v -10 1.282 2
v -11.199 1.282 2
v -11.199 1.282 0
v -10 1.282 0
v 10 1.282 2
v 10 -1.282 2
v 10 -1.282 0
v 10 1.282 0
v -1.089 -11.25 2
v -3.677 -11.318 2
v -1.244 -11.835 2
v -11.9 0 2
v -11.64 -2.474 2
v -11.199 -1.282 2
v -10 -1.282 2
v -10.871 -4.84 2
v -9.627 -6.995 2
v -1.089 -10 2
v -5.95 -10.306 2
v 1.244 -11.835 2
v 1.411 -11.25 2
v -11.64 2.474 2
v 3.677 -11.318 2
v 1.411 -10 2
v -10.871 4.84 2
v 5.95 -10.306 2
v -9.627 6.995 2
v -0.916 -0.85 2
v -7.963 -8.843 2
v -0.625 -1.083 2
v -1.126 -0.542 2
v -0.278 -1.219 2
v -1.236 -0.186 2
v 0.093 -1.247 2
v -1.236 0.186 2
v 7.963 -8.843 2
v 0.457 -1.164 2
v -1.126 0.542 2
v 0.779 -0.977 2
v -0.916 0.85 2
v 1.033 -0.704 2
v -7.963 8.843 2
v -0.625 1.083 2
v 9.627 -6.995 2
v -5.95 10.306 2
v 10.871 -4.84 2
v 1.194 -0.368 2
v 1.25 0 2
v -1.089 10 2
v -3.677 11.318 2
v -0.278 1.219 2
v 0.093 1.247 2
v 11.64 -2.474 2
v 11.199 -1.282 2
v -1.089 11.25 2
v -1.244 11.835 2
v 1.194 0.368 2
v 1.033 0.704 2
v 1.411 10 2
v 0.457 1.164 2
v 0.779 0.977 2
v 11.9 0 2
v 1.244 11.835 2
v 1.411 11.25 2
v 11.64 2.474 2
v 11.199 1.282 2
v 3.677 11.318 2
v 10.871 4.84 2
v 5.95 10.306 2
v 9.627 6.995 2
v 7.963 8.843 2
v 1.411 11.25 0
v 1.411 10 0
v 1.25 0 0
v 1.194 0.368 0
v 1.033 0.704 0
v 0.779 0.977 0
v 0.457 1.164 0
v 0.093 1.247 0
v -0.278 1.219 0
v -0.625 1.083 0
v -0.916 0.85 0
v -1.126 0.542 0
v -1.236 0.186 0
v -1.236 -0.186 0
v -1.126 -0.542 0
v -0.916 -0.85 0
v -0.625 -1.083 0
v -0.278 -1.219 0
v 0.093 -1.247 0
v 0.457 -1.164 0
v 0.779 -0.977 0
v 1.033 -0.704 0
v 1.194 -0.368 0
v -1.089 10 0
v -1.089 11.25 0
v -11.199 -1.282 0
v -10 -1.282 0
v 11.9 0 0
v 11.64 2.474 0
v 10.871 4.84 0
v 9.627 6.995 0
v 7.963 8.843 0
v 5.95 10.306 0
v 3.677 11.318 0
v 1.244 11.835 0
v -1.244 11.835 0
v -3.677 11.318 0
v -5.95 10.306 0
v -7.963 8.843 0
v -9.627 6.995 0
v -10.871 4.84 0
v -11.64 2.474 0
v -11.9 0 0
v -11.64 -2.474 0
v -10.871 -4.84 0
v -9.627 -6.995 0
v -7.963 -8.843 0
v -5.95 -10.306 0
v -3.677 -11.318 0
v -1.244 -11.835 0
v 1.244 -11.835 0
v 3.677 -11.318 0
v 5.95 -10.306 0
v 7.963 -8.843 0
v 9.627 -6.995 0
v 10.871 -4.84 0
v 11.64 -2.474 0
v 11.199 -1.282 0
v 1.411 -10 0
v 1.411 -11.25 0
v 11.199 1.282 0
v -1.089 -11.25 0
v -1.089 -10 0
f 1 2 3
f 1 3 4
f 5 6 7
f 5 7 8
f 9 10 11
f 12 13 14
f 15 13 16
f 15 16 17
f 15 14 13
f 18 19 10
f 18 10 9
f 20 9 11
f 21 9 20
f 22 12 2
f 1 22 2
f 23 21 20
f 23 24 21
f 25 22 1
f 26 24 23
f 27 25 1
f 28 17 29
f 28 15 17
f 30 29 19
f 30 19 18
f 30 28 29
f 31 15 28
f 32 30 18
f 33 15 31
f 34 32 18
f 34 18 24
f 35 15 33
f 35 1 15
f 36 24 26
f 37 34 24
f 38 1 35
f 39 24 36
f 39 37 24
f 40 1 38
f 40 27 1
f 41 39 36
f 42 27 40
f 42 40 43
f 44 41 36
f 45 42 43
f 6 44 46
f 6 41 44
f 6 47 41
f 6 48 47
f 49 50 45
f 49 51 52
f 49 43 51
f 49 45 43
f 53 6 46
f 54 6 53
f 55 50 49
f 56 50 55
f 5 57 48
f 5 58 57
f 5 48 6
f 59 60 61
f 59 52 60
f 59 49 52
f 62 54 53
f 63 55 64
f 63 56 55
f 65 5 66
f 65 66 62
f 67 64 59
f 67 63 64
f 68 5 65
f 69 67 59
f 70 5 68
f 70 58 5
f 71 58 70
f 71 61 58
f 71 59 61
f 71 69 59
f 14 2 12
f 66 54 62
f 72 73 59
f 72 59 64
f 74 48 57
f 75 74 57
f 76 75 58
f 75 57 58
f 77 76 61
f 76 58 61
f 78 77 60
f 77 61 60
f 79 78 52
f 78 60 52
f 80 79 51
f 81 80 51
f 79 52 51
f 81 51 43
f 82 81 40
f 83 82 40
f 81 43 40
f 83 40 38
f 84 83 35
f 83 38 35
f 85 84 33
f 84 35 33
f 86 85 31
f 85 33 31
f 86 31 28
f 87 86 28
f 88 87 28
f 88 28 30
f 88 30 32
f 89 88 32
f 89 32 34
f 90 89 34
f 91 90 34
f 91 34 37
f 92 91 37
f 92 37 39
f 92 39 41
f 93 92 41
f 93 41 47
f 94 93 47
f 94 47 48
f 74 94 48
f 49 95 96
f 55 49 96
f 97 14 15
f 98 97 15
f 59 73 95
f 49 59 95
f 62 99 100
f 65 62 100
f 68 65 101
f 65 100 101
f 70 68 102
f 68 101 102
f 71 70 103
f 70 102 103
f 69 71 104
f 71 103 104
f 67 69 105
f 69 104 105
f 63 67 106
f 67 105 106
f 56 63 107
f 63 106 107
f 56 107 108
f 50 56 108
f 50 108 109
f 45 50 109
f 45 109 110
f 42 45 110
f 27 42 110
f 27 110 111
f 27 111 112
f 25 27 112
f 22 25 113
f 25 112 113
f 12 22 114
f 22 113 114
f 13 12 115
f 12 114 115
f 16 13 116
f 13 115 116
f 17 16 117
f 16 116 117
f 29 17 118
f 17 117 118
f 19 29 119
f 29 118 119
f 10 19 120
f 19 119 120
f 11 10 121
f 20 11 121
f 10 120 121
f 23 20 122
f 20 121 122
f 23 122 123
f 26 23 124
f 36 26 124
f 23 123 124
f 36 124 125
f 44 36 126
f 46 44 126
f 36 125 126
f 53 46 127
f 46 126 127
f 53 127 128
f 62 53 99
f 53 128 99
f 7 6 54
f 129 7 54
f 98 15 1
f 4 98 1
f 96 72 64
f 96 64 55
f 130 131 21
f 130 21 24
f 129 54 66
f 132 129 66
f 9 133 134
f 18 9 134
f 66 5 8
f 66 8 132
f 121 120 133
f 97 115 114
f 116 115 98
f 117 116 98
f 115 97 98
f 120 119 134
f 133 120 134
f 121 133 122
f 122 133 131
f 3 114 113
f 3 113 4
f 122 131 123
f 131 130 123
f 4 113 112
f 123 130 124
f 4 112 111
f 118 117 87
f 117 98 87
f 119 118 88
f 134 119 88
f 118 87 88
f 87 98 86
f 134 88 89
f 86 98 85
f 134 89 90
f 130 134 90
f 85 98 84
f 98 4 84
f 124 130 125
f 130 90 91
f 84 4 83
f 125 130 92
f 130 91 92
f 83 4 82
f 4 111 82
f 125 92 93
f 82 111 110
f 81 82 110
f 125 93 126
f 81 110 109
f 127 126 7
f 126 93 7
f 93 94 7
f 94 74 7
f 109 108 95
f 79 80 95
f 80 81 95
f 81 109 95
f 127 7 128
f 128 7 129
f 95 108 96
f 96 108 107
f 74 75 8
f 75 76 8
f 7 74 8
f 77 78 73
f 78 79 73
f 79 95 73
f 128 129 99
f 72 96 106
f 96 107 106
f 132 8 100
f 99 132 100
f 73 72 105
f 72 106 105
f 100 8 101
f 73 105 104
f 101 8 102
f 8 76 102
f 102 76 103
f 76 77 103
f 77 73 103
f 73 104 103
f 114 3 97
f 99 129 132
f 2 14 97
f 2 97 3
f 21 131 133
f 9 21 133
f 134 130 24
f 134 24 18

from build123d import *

# Parameters (mm, degrees)
SKETCH1_R           = 11.9
BOSS_EXTRUDE1_DEPTH = 2
CUT_EXTRUDE1_REACH  = 18.948
SKETCH3_W           = 1.198540621
SKETCH3_H           = 2.563545218
CUT_EXTRUDE2_REACH  = 18.948
SKETCH4_R           = 1.25
CUT_EXTRUDE3_REACH  = 18.948
SKETCH5_W           = 2.5
SKETCH5_H           = 1.25


with BuildPart() as part:
    # Sketch1 → Boss-Extrude1 (new body)
    with BuildSketch(Plane.XY):
        Circle(SKETCH1_R)
    extrude(amount=BOSS_EXTRUDE1_DEPTH)

    # Sketch3 → Cut-Extrude1 (cut, up to next)
    with BuildSketch(Plane.XY.offset(2), mode=Mode.PRIVATE) as cut_extrude1_sk1:
        with Locations((10.59927031, 0)):
            Rectangle(SKETCH3_W, SKETCH3_H)
    cut_extrude1_tool1 = extrude(cut_extrude1_sk1.sketch, amount=-CUT_EXTRUDE1_REACH, mode=Mode.PRIVATE) & part.part
    # Sketch3 → Cut-Extrude1 (cut, up to next)
    with BuildSketch(Plane.XY.offset(2), mode=Mode.PRIVATE) as cut_extrude1_sk2:
        with Locations((-10.59927031, 0)):
            Rectangle(SKETCH3_W, SKETCH3_H)
    cut_extrude1_tool2 = extrude(cut_extrude1_sk2.sketch, amount=-CUT_EXTRUDE1_REACH, mode=Mode.PRIVATE) & part.part
    add(cut_extrude1_tool1.solids().sort_by_distance((10.59927, 0, 2))[0], mode=Mode.SUBTRACT)
    add(cut_extrude1_tool2.solids().sort_by_distance((-10.59927, 0, 2))[0], mode=Mode.SUBTRACT)

    # Sketch4 → Cut-Extrude2 (cut, up to next)
    with BuildSketch(Plane.XY.offset(2), mode=Mode.PRIVATE) as cut_extrude2_sk1:
        Circle(SKETCH4_R)
    cut_extrude2_tool1 = extrude(cut_extrude2_sk1.sketch, amount=-CUT_EXTRUDE2_REACH, mode=Mode.PRIVATE) & part.part
    add(cut_extrude2_tool1.solids().sort_by_distance((0, 0, 2))[0], mode=Mode.SUBTRACT)

    # Sketch5 → Cut-Extrude3 (cut, up to next)
    with BuildSketch(Plane(origin=(0, 0, 0), x_dir=(-1, 0, 0), z_dir=(0, 0, -1)), mode=Mode.PRIVATE) as cut_extrude3_sk1:
        with Locations((-0.161415602, -10.625)):
            Rectangle(SKETCH5_W, SKETCH5_H)
    cut_extrude3_tool1 = extrude(cut_extrude3_sk1.sketch, amount=-CUT_EXTRUDE3_REACH, mode=Mode.PRIVATE) & part.part
    # Sketch5 → Cut-Extrude3 (cut, up to next)
    with BuildSketch(Plane(origin=(0, 0, 0), x_dir=(-1, 0, 0), z_dir=(0, 0, -1)), mode=Mode.PRIVATE) as cut_extrude3_sk2:
        with Locations((-0.161415602, 10.625)):
            Rectangle(SKETCH5_W, SKETCH5_H)
    cut_extrude3_tool2 = extrude(cut_extrude3_sk2.sketch, amount=-CUT_EXTRUDE3_REACH, mode=Mode.PRIVATE) & part.part
    add(cut_extrude3_tool1.solids().sort_by_distance((0.161416, -10.625, 0))[0], mode=Mode.SUBTRACT)
    add(cut_extrude3_tool2.solids().sort_by_distance((0.161416, 10.625, 0))[0], mode=Mode.SUBTRACT)


solid = part.part
